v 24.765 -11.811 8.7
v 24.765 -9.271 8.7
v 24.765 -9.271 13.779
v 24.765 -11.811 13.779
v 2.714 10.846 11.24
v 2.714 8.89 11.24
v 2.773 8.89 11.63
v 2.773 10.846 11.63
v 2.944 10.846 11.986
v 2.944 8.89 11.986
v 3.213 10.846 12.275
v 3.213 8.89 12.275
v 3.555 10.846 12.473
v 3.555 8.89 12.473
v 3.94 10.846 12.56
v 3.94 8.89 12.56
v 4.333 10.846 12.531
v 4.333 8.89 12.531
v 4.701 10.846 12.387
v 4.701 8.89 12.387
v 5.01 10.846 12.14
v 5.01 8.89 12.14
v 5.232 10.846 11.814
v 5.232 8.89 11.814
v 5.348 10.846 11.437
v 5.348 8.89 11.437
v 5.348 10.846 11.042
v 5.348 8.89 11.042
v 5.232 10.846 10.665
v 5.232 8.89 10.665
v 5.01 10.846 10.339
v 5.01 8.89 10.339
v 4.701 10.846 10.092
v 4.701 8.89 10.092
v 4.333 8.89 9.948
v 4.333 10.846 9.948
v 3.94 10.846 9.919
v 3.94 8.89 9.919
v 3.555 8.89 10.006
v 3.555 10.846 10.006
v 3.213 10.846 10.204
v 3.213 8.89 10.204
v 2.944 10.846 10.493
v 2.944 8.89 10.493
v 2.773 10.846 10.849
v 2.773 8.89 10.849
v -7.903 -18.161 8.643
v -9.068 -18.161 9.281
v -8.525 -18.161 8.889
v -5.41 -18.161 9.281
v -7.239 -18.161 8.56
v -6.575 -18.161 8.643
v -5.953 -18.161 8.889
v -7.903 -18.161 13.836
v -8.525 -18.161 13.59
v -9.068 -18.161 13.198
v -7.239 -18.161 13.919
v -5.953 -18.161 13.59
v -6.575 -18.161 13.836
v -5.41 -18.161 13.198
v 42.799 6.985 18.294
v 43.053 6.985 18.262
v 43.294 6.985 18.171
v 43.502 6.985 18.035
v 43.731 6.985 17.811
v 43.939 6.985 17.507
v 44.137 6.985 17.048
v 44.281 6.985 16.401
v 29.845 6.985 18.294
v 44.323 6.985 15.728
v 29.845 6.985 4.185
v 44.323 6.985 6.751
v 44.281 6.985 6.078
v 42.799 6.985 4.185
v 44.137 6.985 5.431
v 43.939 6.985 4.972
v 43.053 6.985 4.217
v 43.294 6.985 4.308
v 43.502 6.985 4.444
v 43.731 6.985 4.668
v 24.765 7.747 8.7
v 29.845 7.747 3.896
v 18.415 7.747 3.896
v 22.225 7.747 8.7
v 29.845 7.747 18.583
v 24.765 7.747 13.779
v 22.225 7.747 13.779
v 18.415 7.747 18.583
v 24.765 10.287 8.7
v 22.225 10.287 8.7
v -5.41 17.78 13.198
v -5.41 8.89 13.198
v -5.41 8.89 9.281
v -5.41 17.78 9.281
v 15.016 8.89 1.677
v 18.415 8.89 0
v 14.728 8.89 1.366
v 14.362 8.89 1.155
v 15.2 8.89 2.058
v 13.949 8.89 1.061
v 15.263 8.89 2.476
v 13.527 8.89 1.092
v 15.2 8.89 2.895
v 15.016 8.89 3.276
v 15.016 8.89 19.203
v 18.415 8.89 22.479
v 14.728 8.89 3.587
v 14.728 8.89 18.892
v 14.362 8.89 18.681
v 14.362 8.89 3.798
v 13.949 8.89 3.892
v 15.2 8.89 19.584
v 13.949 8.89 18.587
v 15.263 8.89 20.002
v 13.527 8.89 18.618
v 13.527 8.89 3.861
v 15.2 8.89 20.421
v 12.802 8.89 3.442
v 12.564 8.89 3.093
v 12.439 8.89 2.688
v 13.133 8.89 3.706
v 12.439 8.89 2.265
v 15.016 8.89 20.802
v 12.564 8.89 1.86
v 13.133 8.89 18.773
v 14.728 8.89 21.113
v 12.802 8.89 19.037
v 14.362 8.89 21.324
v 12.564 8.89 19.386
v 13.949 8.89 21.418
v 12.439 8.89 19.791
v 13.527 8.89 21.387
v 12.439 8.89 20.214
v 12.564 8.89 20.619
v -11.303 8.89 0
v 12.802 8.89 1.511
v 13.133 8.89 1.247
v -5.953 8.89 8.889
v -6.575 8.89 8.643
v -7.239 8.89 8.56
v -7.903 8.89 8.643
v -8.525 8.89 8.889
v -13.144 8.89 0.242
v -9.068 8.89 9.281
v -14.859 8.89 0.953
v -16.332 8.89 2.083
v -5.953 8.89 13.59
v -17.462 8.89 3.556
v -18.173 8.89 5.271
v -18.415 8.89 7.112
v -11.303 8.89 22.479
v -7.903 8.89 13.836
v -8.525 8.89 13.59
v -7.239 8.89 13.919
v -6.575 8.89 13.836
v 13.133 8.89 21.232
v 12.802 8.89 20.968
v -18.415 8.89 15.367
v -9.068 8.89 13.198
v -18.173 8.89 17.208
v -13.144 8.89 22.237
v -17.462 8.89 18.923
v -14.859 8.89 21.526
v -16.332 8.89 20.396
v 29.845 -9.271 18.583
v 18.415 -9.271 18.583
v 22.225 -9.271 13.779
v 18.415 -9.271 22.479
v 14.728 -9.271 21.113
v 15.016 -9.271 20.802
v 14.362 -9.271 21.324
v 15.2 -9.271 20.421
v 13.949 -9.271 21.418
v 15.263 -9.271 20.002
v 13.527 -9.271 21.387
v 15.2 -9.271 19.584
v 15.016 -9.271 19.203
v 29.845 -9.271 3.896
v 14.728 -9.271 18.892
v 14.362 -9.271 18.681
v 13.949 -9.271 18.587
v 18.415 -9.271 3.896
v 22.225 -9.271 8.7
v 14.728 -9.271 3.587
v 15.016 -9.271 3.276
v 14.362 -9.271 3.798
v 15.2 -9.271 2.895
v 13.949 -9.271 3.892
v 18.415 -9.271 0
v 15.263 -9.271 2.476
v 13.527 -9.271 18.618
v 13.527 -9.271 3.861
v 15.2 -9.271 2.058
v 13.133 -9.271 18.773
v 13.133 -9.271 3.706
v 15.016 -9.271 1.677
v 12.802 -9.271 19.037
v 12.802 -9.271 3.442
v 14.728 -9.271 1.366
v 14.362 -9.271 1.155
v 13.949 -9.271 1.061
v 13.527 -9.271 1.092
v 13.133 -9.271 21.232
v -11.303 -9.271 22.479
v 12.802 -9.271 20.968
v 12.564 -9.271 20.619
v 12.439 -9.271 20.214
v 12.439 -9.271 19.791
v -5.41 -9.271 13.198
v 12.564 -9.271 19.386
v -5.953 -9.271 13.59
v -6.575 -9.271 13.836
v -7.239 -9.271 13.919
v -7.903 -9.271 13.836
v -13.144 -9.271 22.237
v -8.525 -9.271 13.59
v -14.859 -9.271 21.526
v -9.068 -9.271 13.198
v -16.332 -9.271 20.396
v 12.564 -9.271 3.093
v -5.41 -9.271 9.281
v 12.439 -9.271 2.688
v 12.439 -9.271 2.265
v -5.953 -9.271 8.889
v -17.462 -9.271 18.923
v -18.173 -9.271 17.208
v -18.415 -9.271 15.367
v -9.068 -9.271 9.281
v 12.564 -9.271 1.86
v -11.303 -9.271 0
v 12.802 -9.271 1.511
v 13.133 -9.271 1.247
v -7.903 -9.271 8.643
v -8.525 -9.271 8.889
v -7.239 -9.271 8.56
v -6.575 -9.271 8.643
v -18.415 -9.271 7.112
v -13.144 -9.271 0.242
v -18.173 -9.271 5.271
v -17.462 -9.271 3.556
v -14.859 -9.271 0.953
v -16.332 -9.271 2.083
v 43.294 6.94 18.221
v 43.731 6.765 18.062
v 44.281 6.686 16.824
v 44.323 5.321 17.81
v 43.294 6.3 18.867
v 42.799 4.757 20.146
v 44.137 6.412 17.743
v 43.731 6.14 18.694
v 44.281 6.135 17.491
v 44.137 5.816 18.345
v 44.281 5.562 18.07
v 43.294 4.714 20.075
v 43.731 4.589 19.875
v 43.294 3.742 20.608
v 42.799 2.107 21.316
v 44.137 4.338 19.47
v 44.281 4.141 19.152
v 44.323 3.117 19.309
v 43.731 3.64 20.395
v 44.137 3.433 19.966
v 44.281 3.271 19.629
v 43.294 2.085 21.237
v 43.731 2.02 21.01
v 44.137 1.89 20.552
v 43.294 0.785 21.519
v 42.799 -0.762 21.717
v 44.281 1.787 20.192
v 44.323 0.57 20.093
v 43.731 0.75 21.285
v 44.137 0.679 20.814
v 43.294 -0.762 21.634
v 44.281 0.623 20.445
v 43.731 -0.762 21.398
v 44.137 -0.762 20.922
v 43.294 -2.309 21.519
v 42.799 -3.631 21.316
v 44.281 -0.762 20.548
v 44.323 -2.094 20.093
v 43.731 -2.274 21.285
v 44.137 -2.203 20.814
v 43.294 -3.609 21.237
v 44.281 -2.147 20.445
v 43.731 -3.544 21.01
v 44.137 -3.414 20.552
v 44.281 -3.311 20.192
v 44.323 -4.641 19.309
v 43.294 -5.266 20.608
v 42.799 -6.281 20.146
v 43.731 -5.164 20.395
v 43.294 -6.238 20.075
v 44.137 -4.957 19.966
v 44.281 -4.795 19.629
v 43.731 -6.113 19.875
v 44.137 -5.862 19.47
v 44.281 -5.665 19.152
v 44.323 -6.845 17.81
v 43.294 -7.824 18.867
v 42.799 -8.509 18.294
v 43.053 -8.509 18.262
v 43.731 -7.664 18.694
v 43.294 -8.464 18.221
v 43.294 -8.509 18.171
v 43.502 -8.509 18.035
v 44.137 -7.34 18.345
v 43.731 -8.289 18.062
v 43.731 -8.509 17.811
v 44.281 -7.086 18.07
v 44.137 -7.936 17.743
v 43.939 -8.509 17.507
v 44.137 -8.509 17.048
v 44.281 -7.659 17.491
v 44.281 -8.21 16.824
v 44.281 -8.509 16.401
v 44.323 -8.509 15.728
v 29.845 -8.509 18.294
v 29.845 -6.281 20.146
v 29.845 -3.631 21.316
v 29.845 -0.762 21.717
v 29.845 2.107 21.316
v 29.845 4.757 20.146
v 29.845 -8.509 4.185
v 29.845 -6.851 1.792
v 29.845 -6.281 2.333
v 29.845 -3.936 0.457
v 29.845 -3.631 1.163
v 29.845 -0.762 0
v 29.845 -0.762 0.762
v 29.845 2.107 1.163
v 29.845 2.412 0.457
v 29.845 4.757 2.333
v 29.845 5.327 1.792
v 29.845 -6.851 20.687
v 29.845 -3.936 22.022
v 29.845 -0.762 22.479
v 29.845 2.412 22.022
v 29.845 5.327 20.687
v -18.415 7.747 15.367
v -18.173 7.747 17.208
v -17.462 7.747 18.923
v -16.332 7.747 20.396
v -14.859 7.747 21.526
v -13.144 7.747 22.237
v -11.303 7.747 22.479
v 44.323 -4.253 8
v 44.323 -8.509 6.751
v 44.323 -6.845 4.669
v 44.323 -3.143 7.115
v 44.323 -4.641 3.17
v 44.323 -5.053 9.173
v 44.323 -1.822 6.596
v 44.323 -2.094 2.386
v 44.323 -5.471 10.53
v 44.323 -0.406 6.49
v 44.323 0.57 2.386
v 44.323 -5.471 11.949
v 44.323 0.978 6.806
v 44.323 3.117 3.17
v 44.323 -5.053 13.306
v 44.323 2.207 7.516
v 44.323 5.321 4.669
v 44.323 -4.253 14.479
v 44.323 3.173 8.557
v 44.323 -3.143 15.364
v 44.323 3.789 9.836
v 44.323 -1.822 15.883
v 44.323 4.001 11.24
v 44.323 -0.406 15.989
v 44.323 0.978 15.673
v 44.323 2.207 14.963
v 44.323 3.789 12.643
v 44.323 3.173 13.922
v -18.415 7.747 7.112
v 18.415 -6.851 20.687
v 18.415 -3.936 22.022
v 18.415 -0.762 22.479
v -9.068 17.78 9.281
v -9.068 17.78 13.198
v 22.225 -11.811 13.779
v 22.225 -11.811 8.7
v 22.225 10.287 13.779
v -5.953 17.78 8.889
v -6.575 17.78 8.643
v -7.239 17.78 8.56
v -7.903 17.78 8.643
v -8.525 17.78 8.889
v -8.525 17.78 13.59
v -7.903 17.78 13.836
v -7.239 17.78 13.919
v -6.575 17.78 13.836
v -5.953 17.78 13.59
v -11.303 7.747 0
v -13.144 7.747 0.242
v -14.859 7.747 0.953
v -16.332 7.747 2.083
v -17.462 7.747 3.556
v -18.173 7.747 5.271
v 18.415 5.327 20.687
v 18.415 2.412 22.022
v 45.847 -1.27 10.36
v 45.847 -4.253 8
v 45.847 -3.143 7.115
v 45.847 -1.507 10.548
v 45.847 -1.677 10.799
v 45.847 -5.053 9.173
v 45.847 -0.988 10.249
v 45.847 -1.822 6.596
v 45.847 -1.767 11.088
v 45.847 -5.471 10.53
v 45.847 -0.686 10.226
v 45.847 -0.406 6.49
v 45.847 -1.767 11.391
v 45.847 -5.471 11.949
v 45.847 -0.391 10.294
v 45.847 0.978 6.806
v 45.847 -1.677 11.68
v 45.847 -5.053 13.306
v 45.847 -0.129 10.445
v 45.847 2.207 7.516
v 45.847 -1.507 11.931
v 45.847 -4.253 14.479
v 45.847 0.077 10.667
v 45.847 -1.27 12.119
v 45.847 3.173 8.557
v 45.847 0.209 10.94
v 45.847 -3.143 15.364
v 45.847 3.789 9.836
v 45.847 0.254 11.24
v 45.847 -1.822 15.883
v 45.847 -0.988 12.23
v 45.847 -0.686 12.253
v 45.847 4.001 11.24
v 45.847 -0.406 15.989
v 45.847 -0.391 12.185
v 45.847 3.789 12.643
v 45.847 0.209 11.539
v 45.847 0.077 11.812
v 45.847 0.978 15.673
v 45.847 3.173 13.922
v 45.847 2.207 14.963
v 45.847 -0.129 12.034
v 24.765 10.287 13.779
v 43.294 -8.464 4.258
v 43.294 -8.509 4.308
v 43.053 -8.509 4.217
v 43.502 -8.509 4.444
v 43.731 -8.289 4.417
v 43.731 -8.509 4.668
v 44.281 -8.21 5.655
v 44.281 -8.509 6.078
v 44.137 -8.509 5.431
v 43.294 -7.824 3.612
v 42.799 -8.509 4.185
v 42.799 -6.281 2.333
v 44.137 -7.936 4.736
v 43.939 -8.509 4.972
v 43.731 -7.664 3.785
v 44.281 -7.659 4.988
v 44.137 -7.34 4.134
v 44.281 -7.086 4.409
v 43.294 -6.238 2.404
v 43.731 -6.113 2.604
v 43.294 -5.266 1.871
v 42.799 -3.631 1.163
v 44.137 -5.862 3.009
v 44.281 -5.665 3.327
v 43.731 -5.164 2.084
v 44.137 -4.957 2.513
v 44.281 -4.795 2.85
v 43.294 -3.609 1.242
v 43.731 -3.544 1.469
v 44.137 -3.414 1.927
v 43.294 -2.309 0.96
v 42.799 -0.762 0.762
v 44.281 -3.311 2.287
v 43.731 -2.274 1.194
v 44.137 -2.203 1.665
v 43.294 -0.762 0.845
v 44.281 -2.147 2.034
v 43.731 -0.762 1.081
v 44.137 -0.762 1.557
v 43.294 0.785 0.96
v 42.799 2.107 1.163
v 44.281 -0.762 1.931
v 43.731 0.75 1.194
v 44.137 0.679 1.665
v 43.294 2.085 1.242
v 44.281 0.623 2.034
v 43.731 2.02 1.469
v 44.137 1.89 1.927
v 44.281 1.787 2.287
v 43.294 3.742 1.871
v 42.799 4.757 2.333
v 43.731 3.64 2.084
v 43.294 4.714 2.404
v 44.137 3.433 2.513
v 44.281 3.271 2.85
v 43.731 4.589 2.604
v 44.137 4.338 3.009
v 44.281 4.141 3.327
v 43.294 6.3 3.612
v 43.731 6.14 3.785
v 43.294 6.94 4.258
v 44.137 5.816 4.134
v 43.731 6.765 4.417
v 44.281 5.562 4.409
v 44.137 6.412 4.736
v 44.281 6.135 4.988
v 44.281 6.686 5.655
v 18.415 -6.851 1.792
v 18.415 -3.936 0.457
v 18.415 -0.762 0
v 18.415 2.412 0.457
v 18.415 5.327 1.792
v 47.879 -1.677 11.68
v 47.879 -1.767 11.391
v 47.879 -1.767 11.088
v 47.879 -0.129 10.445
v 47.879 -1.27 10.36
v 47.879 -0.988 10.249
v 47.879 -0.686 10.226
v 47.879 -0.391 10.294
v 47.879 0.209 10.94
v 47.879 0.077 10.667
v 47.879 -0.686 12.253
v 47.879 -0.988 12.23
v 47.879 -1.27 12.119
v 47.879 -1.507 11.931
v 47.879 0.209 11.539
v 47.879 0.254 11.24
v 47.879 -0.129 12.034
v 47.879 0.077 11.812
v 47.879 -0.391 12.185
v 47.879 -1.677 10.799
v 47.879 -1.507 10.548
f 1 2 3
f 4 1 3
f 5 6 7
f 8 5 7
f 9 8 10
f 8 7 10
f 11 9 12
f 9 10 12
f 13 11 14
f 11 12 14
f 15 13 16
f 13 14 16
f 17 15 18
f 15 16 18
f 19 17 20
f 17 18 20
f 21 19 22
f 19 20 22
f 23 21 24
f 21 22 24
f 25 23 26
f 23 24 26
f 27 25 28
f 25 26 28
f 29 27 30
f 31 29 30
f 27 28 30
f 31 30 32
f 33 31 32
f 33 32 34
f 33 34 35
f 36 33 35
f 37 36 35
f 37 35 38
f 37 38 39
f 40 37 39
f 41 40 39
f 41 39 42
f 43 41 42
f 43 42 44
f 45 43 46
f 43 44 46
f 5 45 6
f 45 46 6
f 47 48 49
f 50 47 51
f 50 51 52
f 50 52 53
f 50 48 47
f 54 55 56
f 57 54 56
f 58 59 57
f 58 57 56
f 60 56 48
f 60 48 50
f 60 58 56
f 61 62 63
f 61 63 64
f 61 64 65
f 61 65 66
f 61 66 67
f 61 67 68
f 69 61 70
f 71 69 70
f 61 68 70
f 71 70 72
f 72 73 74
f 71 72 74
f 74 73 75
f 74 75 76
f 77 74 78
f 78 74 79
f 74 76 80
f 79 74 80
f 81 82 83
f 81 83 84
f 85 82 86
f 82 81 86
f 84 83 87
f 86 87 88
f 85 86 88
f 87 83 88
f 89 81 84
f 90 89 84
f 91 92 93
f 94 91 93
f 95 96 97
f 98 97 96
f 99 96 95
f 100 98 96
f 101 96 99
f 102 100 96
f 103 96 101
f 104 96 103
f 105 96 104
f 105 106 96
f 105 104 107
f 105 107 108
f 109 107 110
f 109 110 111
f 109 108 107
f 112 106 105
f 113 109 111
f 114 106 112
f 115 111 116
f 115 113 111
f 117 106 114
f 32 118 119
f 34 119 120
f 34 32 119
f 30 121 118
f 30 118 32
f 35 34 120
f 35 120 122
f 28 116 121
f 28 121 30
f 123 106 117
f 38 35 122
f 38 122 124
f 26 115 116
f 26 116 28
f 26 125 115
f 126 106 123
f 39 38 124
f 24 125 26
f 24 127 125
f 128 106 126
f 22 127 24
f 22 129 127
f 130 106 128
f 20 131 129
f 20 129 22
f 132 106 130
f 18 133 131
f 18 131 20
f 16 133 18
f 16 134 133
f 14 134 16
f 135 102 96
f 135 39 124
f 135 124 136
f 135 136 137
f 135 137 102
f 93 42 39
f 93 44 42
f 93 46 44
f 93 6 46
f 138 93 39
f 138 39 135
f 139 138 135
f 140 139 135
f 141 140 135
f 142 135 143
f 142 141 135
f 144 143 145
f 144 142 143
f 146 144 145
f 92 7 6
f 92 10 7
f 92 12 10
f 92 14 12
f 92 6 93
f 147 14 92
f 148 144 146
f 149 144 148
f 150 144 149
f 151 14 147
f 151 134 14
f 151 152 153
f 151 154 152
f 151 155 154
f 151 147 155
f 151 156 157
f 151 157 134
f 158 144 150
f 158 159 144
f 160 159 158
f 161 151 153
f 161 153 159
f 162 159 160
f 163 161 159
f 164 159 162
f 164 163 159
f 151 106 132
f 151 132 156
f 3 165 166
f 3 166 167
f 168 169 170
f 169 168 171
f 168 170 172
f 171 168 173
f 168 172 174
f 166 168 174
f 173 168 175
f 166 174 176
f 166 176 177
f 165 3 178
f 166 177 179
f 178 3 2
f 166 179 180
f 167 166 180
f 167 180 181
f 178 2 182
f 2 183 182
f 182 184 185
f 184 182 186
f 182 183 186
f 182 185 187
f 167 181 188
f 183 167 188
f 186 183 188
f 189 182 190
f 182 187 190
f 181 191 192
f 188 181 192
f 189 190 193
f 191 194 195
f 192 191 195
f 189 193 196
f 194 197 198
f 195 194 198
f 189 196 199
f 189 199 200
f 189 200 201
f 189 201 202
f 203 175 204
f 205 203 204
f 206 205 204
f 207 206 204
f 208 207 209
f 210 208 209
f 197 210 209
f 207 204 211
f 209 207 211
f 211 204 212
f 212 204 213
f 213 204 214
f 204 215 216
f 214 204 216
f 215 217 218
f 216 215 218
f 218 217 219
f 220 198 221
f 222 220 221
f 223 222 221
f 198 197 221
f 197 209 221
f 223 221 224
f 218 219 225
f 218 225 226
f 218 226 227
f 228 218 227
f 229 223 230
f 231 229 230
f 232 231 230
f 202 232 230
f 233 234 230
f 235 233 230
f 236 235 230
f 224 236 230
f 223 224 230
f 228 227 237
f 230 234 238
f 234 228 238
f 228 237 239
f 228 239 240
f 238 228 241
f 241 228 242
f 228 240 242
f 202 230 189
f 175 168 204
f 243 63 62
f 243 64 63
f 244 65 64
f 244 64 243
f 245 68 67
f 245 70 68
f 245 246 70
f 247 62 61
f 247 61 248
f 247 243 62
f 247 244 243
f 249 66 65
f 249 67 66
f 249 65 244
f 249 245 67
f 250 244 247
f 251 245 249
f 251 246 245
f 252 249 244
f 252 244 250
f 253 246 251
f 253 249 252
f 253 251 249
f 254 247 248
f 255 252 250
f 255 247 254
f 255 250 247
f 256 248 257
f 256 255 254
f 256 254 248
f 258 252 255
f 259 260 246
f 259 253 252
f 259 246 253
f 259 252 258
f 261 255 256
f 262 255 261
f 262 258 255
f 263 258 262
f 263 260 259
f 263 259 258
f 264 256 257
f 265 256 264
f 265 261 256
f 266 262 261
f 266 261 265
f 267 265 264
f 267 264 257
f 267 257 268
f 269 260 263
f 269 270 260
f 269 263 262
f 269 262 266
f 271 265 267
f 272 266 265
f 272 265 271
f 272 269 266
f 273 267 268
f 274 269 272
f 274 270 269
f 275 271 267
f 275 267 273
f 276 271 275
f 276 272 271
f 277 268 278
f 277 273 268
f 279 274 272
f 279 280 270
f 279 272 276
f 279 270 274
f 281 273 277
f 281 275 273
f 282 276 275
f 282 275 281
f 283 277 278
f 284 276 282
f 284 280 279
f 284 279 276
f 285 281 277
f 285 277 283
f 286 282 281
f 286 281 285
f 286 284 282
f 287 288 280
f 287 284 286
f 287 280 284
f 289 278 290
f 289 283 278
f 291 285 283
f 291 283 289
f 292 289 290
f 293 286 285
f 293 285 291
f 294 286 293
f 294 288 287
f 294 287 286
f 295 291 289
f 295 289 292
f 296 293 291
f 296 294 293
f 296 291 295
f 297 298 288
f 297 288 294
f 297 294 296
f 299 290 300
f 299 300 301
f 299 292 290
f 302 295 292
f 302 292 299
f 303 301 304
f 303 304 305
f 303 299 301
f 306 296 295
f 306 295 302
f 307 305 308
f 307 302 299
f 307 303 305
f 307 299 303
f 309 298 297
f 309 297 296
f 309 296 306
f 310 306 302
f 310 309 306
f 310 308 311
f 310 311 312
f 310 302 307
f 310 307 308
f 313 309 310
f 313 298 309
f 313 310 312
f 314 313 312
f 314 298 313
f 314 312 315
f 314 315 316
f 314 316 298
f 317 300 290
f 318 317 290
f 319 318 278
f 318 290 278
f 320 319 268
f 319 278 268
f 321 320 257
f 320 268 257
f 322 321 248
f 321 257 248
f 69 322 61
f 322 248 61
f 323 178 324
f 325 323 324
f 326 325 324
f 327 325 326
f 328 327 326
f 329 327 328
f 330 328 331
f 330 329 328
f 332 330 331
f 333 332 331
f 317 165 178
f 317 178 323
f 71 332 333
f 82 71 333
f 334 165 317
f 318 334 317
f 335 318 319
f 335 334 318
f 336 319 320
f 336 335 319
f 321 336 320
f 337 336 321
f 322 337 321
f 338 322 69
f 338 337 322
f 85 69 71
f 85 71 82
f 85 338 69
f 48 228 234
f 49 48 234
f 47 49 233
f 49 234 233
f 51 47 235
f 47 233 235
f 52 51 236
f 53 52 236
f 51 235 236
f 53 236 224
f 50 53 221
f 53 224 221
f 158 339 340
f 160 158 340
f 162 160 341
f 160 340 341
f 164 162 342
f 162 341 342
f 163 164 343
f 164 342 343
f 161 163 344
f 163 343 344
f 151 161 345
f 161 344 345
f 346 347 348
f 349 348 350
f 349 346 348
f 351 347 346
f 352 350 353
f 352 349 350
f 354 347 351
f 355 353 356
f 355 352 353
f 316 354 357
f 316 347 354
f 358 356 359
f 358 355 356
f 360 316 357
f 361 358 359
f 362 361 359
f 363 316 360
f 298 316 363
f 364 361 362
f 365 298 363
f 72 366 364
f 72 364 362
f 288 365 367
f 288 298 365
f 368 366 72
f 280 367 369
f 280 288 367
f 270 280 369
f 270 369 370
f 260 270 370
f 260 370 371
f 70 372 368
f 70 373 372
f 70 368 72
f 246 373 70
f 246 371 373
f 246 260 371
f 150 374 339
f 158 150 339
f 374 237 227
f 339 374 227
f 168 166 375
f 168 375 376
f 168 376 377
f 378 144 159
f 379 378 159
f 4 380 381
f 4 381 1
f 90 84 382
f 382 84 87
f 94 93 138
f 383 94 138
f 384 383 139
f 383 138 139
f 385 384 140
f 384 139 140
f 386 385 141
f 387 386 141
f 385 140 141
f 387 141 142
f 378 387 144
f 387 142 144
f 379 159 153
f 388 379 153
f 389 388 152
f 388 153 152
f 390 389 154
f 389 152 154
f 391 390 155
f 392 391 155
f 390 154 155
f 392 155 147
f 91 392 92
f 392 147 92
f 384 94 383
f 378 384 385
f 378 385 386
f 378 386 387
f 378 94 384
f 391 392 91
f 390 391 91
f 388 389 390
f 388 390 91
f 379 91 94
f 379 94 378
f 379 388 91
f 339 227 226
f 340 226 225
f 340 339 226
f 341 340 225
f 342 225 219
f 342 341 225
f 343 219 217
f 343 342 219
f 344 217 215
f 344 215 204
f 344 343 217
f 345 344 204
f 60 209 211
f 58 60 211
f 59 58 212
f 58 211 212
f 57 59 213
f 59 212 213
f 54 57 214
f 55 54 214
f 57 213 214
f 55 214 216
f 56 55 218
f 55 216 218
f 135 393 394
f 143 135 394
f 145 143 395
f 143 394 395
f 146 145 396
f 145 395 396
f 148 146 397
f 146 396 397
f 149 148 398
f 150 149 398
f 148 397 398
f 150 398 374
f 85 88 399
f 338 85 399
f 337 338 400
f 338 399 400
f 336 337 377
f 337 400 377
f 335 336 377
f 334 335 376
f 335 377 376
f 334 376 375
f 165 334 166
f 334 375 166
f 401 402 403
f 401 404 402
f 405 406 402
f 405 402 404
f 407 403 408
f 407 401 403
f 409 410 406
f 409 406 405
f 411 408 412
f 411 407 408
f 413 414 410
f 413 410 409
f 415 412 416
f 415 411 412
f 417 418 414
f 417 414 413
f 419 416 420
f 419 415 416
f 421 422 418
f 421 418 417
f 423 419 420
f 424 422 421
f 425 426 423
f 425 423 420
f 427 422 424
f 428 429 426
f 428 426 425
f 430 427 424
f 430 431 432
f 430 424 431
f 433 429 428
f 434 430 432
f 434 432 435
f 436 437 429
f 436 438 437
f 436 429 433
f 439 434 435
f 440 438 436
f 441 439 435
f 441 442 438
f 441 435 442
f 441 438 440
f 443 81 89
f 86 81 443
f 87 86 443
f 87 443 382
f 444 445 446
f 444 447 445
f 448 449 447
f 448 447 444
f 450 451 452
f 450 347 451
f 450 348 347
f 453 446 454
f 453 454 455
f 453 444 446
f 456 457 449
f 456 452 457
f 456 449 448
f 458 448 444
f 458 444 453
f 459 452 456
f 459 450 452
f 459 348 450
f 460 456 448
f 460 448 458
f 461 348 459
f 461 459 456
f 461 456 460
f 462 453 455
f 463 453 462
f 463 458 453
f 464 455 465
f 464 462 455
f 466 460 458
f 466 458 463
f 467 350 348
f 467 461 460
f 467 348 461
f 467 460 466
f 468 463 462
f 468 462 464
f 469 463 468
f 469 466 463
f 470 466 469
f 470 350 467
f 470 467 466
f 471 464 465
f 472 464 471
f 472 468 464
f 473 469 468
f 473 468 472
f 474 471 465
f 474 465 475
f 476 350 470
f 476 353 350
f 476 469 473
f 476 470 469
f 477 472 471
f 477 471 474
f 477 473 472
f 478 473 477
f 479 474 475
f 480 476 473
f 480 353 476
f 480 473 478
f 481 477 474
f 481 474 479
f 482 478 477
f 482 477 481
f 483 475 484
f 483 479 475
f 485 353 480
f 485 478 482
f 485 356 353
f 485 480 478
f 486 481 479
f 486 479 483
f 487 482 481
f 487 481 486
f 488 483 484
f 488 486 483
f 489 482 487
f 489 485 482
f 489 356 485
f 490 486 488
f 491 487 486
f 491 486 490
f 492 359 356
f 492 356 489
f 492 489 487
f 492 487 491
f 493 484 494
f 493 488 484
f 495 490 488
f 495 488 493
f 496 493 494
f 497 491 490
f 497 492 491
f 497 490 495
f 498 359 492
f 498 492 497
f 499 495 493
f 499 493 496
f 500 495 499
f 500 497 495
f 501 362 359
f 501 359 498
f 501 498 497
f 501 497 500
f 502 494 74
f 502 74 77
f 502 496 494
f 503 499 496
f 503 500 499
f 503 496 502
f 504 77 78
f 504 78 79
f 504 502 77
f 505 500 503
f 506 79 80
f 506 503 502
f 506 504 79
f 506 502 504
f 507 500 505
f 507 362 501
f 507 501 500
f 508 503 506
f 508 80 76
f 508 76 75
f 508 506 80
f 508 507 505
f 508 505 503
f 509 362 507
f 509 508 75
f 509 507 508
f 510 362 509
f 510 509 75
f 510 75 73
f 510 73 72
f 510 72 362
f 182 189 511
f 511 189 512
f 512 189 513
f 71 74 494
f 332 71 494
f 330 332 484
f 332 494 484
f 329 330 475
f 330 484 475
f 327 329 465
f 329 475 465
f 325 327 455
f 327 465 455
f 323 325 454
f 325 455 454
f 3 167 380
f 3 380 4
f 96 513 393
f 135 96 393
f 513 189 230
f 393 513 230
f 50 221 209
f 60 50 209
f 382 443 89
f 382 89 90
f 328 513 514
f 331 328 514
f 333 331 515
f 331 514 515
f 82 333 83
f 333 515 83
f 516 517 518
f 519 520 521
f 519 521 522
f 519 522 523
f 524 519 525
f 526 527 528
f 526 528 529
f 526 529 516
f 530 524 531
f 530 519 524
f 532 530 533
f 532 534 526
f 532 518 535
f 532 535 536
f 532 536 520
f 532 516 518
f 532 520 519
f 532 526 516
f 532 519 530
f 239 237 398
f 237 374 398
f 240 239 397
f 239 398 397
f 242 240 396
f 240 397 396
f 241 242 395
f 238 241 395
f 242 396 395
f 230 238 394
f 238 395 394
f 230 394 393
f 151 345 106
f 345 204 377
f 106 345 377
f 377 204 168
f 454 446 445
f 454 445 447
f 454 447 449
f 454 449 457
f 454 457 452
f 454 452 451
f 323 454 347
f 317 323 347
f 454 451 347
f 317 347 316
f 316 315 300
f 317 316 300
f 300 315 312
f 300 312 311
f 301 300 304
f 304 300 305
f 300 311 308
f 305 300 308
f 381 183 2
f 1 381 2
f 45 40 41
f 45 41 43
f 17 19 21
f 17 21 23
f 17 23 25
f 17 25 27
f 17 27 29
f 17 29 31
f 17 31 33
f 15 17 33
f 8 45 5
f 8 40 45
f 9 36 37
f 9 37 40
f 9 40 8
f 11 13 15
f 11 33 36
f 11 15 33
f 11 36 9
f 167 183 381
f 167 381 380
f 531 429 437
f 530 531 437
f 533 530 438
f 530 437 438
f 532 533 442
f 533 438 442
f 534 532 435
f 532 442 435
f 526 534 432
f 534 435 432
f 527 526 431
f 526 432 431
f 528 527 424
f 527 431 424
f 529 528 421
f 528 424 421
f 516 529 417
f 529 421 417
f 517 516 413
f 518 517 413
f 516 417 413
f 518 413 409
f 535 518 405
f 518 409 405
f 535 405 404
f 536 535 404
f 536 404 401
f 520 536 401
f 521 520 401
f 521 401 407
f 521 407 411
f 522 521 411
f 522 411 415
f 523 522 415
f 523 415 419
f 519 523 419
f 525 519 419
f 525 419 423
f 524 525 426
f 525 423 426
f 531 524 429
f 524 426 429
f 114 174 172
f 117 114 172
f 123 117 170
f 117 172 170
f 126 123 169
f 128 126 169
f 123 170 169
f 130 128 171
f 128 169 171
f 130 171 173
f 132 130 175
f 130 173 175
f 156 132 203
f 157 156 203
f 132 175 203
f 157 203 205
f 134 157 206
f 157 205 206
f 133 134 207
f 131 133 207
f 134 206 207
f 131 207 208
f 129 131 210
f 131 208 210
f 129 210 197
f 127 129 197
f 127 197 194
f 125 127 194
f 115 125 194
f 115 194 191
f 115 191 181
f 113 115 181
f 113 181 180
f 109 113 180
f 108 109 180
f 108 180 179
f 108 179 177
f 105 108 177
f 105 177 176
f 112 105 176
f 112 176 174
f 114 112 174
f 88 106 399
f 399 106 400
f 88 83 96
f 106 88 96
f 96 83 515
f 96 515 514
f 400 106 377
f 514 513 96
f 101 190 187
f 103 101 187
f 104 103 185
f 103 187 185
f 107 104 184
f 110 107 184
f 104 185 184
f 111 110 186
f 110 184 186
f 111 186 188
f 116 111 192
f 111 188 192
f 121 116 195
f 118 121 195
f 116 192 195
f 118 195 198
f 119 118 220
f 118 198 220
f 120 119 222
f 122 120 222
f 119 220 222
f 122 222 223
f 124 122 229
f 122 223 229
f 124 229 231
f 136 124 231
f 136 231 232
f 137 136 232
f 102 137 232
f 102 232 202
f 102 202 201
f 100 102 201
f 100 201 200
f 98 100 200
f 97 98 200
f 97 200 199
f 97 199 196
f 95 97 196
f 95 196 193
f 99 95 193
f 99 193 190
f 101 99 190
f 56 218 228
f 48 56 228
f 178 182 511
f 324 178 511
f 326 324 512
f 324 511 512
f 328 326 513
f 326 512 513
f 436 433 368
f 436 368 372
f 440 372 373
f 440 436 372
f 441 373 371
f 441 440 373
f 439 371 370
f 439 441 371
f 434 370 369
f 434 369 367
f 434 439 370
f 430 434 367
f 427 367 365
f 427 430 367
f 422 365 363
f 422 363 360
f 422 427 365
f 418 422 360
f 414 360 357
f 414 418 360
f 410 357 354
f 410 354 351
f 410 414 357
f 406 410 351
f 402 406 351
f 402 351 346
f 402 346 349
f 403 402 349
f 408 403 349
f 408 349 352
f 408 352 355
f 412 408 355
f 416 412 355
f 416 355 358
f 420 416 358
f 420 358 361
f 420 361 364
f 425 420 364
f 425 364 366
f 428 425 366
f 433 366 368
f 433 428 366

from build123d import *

# Parameters (mm, degrees)
F0_W      = 36.83
F0_H      = 17.018
F1_DEPTH  = 22.479
F2_R      = 7.112
F1_FACE_W = 17.018
F1_FACE_H = 8.255
F4_DEPTH  = 27.432
F6_DEPTH  = 16.002
F7_R      = 12.816169
F7_R_2    = 4.7625
F8_DEPTH  = 1.524
F9_R      = 1.524
F10_R     = 1.016
F11_DEPTH = 2.032
F12_W     = 2.54
F12_H     = 5.08
F13_DEPTH = 2.54
F15_DEPTH = 1.143
F16_W     = 2.54
F16_H     = 5.08
F17_DEPTH = 2.54
F19_DEPTH = 8.89
F21_DEPTH = 8.89
F22_R     = 1.324614
F23_DEPTH = 1.9558
F24_R     = 1.419753
F25_DEPTH = 25.4


with BuildPart() as f1:
    # F0 (on Top) → F1 (new body)
    with BuildSketch(Plane.XY):
        with Locations((0, -0.762)):
            Rectangle(F0_W, F0_H)
    extrude(amount=F1_DEPTH)

    # F2
    f2_edges = [f1.edges().sort_by_distance(p)[0] for p in [
        (-18.415, -0.762, 22.479),
        (-18.415, -0.762, 0),
    ]]
    fillet(f2_edges, radius=F2_R)

    # F3 (on face) + F1_face (on face) → F4 (join)
    with BuildSketch(Plane.YZ.offset(18.415)):
        with BuildLine():
            Line((-9.271, 18.582747), (-9.271, 3.896253))
            ThreePointArc((-9.271, 3.896253), (-5.441313, 1.020381), (-0.762, 0))
            ThreePointArc((-0.762, 0), (3.917313, 1.020381), (7.747, 3.896253))
            Line((7.747, 3.896253), (7.747, 18.582747))
            ThreePointArc((7.747, 18.582747), (3.917313, 21.458619), (-0.762, 22.479))
            ThreePointArc((-0.762, 22.479), (-5.441313, 21.458619), (-9.271, 18.582747))
        make_face()
    with BuildSketch(Plane(origin=(18.415, -0.762, 11.2395), x_dir=(0, 1, 0), z_dir=(1, 0, 0))):
        Rectangle(F1_FACE_W, F1_FACE_H)
    extrude(amount=F4_DEPTH)

    # F5 (on face) → F6 (cut)
    with BuildSketch(Plane.YZ.offset(45.847)):
        with BuildLine():
            ThreePointArc((13.335, 20.428588), (-0.762, 28.067), (-14.859, 20.428588))
            Line((-14.859, 20.428588), (-14.859, 2.050412))
            ThreePointArc((-14.859, 2.050412), (-0.762, -5.588), (13.335, 2.050412))
            Line((13.335, 2.050412), (13.335, 20.428588))
        make_face()
        with BuildLine():
            ThreePointArc((-9.271, 18.582747), (-0.762, 22.479), (7.747, 18.582747))
            Line((7.747, 18.582747), (7.747, 3.896253))
            ThreePointArc((7.747, 3.896253), (-0.762, 0), (-9.271, 3.896253))
            Line((-9.271, 3.896253), (-9.271, 18.582747))
        make_face(mode=Mode.SUBTRACT)
        with BuildLine():
            Line((7.747, 3.896253), (7.747, 18.582747))
            ThreePointArc((7.747, 18.582747), (-0.762, 22.479), (-9.271, 18.582747))
            Line((-9.271, 18.582747), (-9.271, 3.896253))
            ThreePointArc((-9.271, 3.896253), (-0.762, 0), (7.747, 3.896253))
        make_face()
        with BuildLine():
            Line((-8.509, 4.185282), (-8.509, 18.293718))
            ThreePointArc((-8.509, 18.293718), (-0.762, 21.717), (6.985, 18.293718))
            Line((6.985, 18.293718), (6.985, 4.185282))
            ThreePointArc((6.985, 4.185282), (-0.762, 0.762), (-8.509, 4.185282))
        make_face(mode=Mode.SUBTRACT)
    extrude(amount=-F6_DEPTH, mode=Mode.SUBTRACT)

    # F7 (on face) → F8 (cut)
    with BuildSketch(Plane.YZ.offset(45.847)):
        with Locations((-0.762, 11.2395)):
            Circle(F7_R)
        with BuildLine():
            ThreePointArc((6.985, 4.185282), (-0.762, 0.762), (-8.509, 4.185282))
            Line((-8.509, 4.185282), (-8.509, 18.293718))
            ThreePointArc((-8.509, 18.293718), (-0.762, 21.717), (6.985, 18.293718))
            Line((6.985, 18.293718), (6.985, 4.185282))
        make_face(mode=Mode.SUBTRACT)
        with BuildLine():
            Line((-8.509, 18.293718), (-8.509, 4.185282))
            ThreePointArc((-8.509, 4.185282), (-0.762, 0.762), (6.985, 4.185282))
            Line((6.985, 4.185282), (6.985, 18.293718))
            ThreePointArc((6.985, 18.293718), (-0.762, 21.717), (-8.509, 18.293718))
        make_face()
        with Locations((-0.762, 11.2395)):
            Circle(F7_R_2, mode=Mode.SUBTRACT)
    extrude(amount=-F8_DEPTH, mode=Mode.SUBTRACT)

    # F9
    f9_edges = [f1.edges().sort_by_distance(p)[0] for p in [
        (44.323, -0.762, 0.762),
        (44.323, -0.762, 21.717),
    ]]
    fillet(f9_edges, radius=F9_R)

    # F10 (on face) → F11 (join)
    with BuildSketch(Plane.YZ.offset(45.847)):
        with Locations((-0.762, 11.2395)):
            Circle(F10_R)
    extrude(amount=F11_DEPTH)

    # F12 (on face) → F13 (join)
    with BuildSketch(Plane.XZ.offset(9.271)):
        with Locations((23.495, 11.2395)):
            Rectangle(F12_W, F12_H)
    extrude(amount=F13_DEPTH)

    # F14 (on face) → F15 (join)
    with BuildSketch(Plane(origin=(0, 7.747, 0), x_dir=(-1, 0, 0), z_dir=(0, 1, 0))):
        with BuildLine():
            Line((-18.415, 0), (11.303, 0))
            ThreePointArc((11.303, 0), (16.331943, 2.083057), (18.415, 7.112))
            Line((18.415, 7.112), (18.415, 15.367))
            ThreePointArc((18.415, 15.367), (16.331943, 20.395943), (11.303, 22.479))
            Line((11.303, 22.479), (-18.415, 22.479))
            Line((-18.415, 22.479), (-18.415, 18.582747))
            Line((-18.415, 18.582747), (-18.415, 3.896253))
            Line((-18.415, 3.896253), (-18.415, 0))
        make_face()
    extrude(amount=F15_DEPTH)

    # F16 (on face) → F17 (join)
    with BuildSketch(Plane(origin=(0, 7.747, 0), x_dir=(-1, 0, 0), z_dir=(0, 1, 0))):
        with Locations((-23.495, 11.2395)):
            Rectangle(F16_W, F16_H)
    extrude(amount=F17_DEPTH)

    # F18 (on face) → F19 (join)
    with BuildSketch(Plane.XZ.offset(9.271)):
        with BuildLine():
            Line((-5.4102, 9.280857), (-5.4102, 13.198143))
            ThreePointArc((-5.4102, 13.198143), (-7.239, 13.9192), (-9.0678, 13.198143))
            Line((-9.0678, 13.198143), (-9.0678, 9.280857))
            ThreePointArc((-9.0678, 9.280857), (-7.239, 8.5598), (-5.4102, 9.280857))
        make_face()
    extrude(amount=F19_DEPTH)

    # F20 (on face) → F21 (join)
    with BuildSketch(Plane(origin=(0, 8.89, 0), x_dir=(-1, 0, 0), z_dir=(0, 1, 0))):
        with BuildLine():
            Line((5.4102, 13.198143), (5.4102, 9.280857))
            ThreePointArc((5.4102, 9.280857), (7.239, 8.5598), (9.0678, 9.280857))
            Line((9.0678, 9.280857), (9.0678, 13.198143))
            ThreePointArc((9.0678, 13.198143), (7.239, 13.9192), (5.4102, 13.198143))
        make_face()
    extrude(amount=F21_DEPTH)

    # F22 (on face) → F23 (join)
    with BuildSketch(Plane(origin=(0, 8.89, 0), x_dir=(-1, 0, 0), z_dir=(0, 1, 0))):
        with Locations((-4.0386, 11.2395)):
            Circle(F22_R)
    extrude(amount=F23_DEPTH)

    # F24 (on face) → F25 (cut)
    with BuildSketch(Plane.XZ.offset(9.271)):
        with Locations((13.843, 20.0025)):
            Circle(F24_R)
        with Locations((13.843, 2.4765)):
            Circle(F24_R)
    extrude(amount=-F25_DEPTH, mode=Mode.SUBTRACT)


solid = f1.part
